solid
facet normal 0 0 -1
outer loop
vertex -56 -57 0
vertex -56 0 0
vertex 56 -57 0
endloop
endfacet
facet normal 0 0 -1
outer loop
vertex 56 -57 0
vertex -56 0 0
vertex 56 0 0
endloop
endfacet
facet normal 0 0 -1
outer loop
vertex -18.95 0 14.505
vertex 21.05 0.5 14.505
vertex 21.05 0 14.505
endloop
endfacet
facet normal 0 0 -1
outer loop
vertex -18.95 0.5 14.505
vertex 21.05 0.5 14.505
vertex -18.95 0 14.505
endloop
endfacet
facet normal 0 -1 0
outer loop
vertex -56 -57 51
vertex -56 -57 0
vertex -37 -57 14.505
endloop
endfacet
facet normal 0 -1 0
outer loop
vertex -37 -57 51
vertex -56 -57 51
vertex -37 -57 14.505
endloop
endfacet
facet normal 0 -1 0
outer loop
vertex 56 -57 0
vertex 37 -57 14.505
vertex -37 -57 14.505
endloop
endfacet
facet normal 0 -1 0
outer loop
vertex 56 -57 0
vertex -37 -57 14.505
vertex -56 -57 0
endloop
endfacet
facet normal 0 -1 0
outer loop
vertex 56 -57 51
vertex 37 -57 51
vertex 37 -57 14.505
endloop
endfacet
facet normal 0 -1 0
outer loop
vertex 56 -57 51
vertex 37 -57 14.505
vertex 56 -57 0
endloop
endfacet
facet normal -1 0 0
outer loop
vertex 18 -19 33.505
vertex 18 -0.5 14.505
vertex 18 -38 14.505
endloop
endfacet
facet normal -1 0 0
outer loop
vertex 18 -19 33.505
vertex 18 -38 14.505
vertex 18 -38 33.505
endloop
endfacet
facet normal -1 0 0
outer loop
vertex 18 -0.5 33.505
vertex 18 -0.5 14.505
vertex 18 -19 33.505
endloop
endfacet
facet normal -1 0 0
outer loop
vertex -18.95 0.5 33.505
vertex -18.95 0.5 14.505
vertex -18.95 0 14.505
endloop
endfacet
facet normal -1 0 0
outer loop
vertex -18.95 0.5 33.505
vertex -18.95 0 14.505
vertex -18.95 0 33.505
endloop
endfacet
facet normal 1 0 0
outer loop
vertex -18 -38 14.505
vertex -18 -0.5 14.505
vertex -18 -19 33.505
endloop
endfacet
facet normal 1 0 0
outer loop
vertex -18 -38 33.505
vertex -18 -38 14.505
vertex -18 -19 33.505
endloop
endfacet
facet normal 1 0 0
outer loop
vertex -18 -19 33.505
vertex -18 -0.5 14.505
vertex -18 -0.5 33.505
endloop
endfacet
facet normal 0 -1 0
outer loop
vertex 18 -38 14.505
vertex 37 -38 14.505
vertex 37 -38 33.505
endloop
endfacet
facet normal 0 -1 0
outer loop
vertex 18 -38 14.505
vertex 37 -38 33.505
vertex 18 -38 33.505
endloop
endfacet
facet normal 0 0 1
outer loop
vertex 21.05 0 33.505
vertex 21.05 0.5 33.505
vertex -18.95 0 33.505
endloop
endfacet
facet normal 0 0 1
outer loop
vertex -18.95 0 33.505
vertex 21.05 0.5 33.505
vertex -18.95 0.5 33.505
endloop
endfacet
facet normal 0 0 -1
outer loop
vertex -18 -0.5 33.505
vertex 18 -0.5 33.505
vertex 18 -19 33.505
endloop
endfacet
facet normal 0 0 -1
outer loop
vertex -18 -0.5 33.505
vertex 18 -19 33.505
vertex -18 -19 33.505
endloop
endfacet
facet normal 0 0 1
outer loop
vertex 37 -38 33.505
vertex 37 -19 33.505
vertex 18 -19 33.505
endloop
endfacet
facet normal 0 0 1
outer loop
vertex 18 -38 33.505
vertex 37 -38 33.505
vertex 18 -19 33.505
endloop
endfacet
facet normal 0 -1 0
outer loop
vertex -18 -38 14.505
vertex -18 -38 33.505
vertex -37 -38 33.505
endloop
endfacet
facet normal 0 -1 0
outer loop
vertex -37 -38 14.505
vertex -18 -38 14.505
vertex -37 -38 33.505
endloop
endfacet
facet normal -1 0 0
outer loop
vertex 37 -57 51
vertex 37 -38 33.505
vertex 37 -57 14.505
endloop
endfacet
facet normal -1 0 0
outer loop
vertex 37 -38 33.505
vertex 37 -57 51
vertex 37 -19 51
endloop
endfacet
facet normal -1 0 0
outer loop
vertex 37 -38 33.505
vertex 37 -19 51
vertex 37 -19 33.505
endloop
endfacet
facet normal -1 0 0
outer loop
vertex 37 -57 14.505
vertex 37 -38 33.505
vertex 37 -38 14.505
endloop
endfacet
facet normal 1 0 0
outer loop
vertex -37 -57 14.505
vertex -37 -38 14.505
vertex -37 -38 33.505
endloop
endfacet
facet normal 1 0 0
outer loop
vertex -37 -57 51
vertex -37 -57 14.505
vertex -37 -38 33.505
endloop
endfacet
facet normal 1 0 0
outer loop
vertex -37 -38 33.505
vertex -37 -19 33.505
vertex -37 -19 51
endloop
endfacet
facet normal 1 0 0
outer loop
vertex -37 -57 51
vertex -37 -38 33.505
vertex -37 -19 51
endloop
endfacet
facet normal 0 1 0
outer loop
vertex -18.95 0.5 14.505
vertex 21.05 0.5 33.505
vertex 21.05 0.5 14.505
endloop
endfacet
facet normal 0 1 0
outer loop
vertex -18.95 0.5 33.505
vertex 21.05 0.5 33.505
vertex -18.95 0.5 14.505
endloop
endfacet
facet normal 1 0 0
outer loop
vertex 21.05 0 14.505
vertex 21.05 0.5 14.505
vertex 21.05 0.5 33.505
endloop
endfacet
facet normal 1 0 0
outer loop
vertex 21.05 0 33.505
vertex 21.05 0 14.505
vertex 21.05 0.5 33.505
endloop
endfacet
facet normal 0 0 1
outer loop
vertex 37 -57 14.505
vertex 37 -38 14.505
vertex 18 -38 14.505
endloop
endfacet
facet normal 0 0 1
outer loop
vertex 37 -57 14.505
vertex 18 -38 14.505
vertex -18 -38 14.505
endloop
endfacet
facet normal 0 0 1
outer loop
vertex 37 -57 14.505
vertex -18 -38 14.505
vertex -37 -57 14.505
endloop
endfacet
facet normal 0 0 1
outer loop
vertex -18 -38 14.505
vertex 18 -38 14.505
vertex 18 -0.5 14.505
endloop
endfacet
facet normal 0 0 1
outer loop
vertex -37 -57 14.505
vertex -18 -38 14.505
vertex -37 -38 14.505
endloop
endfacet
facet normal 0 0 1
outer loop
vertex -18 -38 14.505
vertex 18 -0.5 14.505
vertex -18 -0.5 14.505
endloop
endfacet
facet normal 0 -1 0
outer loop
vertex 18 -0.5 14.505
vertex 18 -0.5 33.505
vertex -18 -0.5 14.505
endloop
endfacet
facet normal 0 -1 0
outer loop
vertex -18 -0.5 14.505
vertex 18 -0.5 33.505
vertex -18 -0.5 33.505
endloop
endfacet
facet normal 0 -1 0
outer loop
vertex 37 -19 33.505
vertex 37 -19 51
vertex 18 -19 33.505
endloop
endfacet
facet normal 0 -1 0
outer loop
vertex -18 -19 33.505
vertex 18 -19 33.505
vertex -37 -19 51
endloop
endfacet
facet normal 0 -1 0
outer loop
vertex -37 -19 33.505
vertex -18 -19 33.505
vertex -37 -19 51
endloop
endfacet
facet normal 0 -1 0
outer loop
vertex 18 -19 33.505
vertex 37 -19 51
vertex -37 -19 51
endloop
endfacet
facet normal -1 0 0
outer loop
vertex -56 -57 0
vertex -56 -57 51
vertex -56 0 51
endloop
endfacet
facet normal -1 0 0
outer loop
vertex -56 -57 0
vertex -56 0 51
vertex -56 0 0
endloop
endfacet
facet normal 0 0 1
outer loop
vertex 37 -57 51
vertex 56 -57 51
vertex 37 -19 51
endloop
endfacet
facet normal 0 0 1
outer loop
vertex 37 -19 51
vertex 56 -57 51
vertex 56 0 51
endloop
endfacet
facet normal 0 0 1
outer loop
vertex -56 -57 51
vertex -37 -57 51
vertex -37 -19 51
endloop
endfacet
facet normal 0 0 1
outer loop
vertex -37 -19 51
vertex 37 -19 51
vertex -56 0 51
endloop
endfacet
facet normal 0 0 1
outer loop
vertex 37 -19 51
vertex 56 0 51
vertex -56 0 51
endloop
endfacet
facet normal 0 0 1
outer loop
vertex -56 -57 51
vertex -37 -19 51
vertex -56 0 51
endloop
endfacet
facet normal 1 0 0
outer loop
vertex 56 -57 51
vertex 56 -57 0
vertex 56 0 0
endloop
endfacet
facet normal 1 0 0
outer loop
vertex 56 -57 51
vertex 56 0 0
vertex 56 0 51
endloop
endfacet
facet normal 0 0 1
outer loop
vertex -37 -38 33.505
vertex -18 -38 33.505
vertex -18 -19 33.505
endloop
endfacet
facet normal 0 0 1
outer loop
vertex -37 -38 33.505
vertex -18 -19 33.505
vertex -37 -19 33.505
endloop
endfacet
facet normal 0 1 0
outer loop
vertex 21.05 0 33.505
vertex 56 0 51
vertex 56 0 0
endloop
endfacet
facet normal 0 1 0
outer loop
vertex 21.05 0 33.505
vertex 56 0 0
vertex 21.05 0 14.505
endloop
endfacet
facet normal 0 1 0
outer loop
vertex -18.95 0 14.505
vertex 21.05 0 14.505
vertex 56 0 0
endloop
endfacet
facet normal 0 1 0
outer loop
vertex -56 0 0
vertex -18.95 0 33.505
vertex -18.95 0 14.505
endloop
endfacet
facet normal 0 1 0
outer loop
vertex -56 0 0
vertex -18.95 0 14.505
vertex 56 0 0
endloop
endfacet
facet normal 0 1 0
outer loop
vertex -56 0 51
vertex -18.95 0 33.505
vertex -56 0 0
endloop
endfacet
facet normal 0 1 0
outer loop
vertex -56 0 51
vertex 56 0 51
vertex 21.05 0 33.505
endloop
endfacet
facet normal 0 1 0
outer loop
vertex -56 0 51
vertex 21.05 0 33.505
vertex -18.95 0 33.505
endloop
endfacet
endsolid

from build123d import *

# Parameters (mm, degrees)
F1_DEPTH = 57
F2_W     = 19
F2_H     = 19
F3_DEPTH = 38
F4_W     = 74
F4_H     = 17.495044
F5_DEPTH = 19
F6_W     = 40
F6_H     = 19
F7_DEPTH = 0.5


with BuildPart() as f1:
    # F0 (on Front) → F1 (new body)
    with BuildSketch(Plane.XZ):
        Polygon((-56, 0), (0, 0), (56, 0), (56, 51), (37, 51), (37, 14.504956), (-37, 14.504956), (-37, 51), (-56, 51), align=None)
    extrude(amount=F1_DEPTH)

    # F2 (on face) → F3 (join)
    with BuildSketch(Plane(origin=(0, 0, 0), x_dir=(-1, 0, 0), z_dir=(0, 1, 0))):
        with Locations((27.5, 24.004956)):
            Rectangle(F2_W, F2_H)
        with Locations((-27.5, 24.004956)):
            Rectangle(F2_W, F2_H)
    extrude(amount=-F3_DEPTH)

    # F4 (on face) → F5 (join)
    with BuildSketch(Plane(origin=(0, 0, 0), x_dir=(-1, 0, 0), z_dir=(0, 1, 0))):
        with Locations((0, 42.252478)):
            Rectangle(F4_W, F4_H)
    extrude(amount=-F5_DEPTH)

    # F6 (on face) → F7 (join, symmetric)
    with BuildSketch(Plane(origin=(0, 0, 0), x_dir=(-1, 0, 0), z_dir=(0, 1, 0))):
        with Locations((-1.049917, 24.004956)):
            Rectangle(F6_W, F6_H)
    extrude(amount=F7_DEPTH, both=True)


solid = f1.part
